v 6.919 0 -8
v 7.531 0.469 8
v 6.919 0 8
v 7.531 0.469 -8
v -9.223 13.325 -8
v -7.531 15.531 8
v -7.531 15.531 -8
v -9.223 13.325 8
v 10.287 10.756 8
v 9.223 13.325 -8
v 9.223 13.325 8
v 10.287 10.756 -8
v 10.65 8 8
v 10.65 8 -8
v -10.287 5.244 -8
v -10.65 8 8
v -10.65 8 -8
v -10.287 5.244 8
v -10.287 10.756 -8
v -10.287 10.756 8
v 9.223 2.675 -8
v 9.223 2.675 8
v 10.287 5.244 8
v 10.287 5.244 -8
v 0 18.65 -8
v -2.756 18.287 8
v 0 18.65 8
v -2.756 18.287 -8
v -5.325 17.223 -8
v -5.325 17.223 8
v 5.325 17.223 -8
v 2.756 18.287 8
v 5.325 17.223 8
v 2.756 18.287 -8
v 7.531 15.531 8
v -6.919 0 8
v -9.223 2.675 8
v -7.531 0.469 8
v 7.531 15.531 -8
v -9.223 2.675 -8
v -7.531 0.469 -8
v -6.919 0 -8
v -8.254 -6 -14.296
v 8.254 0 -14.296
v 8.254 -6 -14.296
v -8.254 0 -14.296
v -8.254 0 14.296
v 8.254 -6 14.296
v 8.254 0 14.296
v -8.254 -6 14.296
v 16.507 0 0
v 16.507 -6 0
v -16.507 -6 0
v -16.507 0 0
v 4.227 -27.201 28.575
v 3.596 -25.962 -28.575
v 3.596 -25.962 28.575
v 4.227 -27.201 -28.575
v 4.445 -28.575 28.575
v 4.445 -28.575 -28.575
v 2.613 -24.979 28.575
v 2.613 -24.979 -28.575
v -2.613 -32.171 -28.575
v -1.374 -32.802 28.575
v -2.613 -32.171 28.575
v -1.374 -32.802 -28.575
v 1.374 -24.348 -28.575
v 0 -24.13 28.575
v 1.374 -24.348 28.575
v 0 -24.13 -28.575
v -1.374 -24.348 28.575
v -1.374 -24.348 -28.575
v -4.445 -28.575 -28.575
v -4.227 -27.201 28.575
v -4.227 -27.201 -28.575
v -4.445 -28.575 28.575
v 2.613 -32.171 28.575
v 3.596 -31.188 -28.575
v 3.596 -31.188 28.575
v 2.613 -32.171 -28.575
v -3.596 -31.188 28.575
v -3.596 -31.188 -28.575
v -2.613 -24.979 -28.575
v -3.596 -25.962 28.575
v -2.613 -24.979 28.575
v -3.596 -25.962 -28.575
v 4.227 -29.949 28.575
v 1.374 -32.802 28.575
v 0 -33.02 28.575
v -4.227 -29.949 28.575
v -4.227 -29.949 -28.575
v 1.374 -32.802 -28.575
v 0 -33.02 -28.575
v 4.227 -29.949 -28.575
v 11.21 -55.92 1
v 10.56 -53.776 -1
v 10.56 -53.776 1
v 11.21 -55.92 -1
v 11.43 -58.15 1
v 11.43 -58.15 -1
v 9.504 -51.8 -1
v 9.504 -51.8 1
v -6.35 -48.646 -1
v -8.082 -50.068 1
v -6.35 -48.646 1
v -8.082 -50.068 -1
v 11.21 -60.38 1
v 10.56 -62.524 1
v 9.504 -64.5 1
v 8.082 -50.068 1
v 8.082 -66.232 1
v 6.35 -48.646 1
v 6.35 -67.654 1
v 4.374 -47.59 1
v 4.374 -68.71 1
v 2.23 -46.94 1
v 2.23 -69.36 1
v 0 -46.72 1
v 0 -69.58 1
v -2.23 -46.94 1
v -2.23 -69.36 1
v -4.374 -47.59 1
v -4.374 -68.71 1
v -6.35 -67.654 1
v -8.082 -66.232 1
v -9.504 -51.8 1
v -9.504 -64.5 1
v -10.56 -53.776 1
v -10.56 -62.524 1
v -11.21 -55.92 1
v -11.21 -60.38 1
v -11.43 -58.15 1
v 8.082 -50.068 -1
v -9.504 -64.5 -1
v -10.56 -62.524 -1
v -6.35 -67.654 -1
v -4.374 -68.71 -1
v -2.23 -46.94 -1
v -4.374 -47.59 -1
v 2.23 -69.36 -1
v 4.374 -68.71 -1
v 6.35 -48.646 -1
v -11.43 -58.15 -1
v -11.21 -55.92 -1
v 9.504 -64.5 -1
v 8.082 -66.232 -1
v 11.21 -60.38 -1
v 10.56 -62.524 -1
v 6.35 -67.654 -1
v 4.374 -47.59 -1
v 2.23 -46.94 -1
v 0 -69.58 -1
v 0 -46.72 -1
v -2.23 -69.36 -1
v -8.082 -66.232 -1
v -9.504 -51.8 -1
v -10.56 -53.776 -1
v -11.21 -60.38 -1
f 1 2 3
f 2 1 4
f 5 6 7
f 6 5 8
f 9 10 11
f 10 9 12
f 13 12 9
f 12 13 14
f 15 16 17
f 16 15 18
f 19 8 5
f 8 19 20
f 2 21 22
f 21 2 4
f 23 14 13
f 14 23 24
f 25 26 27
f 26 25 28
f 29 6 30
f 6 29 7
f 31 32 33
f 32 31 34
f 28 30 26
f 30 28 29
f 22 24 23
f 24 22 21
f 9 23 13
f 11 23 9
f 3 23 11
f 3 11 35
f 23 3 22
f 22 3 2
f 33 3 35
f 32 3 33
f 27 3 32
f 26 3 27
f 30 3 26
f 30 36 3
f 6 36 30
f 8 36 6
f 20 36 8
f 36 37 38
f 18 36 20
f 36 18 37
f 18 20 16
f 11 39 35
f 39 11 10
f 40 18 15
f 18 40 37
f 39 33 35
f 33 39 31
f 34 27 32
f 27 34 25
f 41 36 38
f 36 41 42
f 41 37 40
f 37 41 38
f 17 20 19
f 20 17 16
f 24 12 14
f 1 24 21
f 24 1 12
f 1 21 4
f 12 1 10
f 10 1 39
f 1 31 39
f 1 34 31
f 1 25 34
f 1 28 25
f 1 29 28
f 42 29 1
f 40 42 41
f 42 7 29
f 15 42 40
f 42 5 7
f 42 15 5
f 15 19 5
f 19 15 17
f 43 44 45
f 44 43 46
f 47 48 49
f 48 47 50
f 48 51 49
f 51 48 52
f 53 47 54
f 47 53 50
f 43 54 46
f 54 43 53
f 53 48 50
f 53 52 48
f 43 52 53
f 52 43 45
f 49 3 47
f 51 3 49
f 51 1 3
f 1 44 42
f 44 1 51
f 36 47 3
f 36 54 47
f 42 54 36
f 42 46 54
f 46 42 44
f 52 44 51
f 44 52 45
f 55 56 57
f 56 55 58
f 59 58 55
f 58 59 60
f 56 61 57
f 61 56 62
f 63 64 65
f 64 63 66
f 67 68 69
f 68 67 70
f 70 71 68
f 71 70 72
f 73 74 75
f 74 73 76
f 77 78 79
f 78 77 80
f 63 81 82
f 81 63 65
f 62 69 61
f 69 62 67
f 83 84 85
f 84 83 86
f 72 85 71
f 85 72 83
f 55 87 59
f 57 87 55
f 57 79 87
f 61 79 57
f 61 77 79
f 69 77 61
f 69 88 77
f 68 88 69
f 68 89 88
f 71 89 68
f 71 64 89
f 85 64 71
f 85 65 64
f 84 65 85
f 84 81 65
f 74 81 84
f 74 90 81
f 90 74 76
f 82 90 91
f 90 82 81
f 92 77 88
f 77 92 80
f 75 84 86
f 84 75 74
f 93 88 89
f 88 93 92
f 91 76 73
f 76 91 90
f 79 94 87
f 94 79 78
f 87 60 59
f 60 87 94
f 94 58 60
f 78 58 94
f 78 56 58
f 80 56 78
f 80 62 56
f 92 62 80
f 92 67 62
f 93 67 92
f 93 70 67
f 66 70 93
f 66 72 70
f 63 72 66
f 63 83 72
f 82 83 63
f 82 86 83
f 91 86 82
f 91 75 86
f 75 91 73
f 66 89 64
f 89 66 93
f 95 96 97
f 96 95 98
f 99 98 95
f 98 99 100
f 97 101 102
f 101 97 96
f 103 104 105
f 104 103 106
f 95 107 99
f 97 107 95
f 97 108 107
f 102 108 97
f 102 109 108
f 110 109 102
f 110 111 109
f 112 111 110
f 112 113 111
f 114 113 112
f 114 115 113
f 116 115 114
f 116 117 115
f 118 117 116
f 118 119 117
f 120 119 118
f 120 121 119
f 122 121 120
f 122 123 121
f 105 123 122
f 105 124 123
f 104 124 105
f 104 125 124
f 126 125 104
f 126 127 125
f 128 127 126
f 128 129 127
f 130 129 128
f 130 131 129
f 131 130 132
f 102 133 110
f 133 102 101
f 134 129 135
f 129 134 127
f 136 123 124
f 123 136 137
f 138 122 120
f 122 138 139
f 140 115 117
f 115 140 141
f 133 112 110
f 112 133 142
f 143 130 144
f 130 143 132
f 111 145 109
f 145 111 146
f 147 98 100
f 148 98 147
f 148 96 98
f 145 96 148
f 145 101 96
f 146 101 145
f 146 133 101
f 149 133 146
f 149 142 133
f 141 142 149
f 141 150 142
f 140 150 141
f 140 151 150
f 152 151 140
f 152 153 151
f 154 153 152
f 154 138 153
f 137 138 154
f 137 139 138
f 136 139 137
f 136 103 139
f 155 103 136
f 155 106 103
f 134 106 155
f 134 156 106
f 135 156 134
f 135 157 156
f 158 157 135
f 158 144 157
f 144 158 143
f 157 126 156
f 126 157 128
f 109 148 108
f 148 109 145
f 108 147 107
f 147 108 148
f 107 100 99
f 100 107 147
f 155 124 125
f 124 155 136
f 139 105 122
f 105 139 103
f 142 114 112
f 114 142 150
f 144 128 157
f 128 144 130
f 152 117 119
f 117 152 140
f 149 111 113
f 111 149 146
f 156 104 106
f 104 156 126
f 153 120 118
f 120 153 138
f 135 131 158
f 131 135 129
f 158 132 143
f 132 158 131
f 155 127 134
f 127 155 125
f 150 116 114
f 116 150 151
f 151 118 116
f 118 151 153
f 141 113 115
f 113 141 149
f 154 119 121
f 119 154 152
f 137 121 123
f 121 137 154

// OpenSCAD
// Auto-generated by scripts/author_from_manifest.py (Phase D.3).
// Source: data/phase_d_manifest.json (sku_intent='viking-vk300-qr-pendent-155f').
// Do not hand-edit — regenerate from the manifest.
//
// @part viking_vk300_qr_pendent_155f
// @kind sprinkler_head
// @category head.pendant.k56
// @display-name "Viking VK300 Quick-Response Pendent K5.6 155°F"
// @mfg viking_group
// @mfg-pn VK300
// @listing UL FM
// @hazard-classes LH OH1
// @price-usd 14.50
// @install-minutes 8
// @crew journeyman
// @k-factor 5.6
// @orientation pendant
// @response quick
// @temperature 155F
// @param size_in number default=0.5 label="Size" unit="in"
// @port inlet position=[0,0.014,0] direction=[0,1,0] style=NPT_threaded size_in=0.5 role=drop

size_in = 0.5;
k_factor = 5.6;

length_mm   = 57.15;
body_dia_mm = 25.40;
thread_od   = 21.3;
thread_len  = 16;
deflector_d = body_dia_mm * 0.9;

 union() {
    translate([0, thread_len/2, 0])
        cylinder(h = thread_len, d = thread_od, center = true, $fn = 24);
    translate([0, -3, 0])
        rotate([90, 0, 0])
        cylinder(h = 6, d = thread_od * 1.55, $fn = 6, center = true);
    translate([0, -length_mm/2, 0])
        cylinder(h = length_mm, d = body_dia_mm * 0.35, center = true, $fn = 20);
    translate([0, -length_mm - 1, 0])
        cylinder(h = 2, d = deflector_d, center = true, $fn = 32);
}
